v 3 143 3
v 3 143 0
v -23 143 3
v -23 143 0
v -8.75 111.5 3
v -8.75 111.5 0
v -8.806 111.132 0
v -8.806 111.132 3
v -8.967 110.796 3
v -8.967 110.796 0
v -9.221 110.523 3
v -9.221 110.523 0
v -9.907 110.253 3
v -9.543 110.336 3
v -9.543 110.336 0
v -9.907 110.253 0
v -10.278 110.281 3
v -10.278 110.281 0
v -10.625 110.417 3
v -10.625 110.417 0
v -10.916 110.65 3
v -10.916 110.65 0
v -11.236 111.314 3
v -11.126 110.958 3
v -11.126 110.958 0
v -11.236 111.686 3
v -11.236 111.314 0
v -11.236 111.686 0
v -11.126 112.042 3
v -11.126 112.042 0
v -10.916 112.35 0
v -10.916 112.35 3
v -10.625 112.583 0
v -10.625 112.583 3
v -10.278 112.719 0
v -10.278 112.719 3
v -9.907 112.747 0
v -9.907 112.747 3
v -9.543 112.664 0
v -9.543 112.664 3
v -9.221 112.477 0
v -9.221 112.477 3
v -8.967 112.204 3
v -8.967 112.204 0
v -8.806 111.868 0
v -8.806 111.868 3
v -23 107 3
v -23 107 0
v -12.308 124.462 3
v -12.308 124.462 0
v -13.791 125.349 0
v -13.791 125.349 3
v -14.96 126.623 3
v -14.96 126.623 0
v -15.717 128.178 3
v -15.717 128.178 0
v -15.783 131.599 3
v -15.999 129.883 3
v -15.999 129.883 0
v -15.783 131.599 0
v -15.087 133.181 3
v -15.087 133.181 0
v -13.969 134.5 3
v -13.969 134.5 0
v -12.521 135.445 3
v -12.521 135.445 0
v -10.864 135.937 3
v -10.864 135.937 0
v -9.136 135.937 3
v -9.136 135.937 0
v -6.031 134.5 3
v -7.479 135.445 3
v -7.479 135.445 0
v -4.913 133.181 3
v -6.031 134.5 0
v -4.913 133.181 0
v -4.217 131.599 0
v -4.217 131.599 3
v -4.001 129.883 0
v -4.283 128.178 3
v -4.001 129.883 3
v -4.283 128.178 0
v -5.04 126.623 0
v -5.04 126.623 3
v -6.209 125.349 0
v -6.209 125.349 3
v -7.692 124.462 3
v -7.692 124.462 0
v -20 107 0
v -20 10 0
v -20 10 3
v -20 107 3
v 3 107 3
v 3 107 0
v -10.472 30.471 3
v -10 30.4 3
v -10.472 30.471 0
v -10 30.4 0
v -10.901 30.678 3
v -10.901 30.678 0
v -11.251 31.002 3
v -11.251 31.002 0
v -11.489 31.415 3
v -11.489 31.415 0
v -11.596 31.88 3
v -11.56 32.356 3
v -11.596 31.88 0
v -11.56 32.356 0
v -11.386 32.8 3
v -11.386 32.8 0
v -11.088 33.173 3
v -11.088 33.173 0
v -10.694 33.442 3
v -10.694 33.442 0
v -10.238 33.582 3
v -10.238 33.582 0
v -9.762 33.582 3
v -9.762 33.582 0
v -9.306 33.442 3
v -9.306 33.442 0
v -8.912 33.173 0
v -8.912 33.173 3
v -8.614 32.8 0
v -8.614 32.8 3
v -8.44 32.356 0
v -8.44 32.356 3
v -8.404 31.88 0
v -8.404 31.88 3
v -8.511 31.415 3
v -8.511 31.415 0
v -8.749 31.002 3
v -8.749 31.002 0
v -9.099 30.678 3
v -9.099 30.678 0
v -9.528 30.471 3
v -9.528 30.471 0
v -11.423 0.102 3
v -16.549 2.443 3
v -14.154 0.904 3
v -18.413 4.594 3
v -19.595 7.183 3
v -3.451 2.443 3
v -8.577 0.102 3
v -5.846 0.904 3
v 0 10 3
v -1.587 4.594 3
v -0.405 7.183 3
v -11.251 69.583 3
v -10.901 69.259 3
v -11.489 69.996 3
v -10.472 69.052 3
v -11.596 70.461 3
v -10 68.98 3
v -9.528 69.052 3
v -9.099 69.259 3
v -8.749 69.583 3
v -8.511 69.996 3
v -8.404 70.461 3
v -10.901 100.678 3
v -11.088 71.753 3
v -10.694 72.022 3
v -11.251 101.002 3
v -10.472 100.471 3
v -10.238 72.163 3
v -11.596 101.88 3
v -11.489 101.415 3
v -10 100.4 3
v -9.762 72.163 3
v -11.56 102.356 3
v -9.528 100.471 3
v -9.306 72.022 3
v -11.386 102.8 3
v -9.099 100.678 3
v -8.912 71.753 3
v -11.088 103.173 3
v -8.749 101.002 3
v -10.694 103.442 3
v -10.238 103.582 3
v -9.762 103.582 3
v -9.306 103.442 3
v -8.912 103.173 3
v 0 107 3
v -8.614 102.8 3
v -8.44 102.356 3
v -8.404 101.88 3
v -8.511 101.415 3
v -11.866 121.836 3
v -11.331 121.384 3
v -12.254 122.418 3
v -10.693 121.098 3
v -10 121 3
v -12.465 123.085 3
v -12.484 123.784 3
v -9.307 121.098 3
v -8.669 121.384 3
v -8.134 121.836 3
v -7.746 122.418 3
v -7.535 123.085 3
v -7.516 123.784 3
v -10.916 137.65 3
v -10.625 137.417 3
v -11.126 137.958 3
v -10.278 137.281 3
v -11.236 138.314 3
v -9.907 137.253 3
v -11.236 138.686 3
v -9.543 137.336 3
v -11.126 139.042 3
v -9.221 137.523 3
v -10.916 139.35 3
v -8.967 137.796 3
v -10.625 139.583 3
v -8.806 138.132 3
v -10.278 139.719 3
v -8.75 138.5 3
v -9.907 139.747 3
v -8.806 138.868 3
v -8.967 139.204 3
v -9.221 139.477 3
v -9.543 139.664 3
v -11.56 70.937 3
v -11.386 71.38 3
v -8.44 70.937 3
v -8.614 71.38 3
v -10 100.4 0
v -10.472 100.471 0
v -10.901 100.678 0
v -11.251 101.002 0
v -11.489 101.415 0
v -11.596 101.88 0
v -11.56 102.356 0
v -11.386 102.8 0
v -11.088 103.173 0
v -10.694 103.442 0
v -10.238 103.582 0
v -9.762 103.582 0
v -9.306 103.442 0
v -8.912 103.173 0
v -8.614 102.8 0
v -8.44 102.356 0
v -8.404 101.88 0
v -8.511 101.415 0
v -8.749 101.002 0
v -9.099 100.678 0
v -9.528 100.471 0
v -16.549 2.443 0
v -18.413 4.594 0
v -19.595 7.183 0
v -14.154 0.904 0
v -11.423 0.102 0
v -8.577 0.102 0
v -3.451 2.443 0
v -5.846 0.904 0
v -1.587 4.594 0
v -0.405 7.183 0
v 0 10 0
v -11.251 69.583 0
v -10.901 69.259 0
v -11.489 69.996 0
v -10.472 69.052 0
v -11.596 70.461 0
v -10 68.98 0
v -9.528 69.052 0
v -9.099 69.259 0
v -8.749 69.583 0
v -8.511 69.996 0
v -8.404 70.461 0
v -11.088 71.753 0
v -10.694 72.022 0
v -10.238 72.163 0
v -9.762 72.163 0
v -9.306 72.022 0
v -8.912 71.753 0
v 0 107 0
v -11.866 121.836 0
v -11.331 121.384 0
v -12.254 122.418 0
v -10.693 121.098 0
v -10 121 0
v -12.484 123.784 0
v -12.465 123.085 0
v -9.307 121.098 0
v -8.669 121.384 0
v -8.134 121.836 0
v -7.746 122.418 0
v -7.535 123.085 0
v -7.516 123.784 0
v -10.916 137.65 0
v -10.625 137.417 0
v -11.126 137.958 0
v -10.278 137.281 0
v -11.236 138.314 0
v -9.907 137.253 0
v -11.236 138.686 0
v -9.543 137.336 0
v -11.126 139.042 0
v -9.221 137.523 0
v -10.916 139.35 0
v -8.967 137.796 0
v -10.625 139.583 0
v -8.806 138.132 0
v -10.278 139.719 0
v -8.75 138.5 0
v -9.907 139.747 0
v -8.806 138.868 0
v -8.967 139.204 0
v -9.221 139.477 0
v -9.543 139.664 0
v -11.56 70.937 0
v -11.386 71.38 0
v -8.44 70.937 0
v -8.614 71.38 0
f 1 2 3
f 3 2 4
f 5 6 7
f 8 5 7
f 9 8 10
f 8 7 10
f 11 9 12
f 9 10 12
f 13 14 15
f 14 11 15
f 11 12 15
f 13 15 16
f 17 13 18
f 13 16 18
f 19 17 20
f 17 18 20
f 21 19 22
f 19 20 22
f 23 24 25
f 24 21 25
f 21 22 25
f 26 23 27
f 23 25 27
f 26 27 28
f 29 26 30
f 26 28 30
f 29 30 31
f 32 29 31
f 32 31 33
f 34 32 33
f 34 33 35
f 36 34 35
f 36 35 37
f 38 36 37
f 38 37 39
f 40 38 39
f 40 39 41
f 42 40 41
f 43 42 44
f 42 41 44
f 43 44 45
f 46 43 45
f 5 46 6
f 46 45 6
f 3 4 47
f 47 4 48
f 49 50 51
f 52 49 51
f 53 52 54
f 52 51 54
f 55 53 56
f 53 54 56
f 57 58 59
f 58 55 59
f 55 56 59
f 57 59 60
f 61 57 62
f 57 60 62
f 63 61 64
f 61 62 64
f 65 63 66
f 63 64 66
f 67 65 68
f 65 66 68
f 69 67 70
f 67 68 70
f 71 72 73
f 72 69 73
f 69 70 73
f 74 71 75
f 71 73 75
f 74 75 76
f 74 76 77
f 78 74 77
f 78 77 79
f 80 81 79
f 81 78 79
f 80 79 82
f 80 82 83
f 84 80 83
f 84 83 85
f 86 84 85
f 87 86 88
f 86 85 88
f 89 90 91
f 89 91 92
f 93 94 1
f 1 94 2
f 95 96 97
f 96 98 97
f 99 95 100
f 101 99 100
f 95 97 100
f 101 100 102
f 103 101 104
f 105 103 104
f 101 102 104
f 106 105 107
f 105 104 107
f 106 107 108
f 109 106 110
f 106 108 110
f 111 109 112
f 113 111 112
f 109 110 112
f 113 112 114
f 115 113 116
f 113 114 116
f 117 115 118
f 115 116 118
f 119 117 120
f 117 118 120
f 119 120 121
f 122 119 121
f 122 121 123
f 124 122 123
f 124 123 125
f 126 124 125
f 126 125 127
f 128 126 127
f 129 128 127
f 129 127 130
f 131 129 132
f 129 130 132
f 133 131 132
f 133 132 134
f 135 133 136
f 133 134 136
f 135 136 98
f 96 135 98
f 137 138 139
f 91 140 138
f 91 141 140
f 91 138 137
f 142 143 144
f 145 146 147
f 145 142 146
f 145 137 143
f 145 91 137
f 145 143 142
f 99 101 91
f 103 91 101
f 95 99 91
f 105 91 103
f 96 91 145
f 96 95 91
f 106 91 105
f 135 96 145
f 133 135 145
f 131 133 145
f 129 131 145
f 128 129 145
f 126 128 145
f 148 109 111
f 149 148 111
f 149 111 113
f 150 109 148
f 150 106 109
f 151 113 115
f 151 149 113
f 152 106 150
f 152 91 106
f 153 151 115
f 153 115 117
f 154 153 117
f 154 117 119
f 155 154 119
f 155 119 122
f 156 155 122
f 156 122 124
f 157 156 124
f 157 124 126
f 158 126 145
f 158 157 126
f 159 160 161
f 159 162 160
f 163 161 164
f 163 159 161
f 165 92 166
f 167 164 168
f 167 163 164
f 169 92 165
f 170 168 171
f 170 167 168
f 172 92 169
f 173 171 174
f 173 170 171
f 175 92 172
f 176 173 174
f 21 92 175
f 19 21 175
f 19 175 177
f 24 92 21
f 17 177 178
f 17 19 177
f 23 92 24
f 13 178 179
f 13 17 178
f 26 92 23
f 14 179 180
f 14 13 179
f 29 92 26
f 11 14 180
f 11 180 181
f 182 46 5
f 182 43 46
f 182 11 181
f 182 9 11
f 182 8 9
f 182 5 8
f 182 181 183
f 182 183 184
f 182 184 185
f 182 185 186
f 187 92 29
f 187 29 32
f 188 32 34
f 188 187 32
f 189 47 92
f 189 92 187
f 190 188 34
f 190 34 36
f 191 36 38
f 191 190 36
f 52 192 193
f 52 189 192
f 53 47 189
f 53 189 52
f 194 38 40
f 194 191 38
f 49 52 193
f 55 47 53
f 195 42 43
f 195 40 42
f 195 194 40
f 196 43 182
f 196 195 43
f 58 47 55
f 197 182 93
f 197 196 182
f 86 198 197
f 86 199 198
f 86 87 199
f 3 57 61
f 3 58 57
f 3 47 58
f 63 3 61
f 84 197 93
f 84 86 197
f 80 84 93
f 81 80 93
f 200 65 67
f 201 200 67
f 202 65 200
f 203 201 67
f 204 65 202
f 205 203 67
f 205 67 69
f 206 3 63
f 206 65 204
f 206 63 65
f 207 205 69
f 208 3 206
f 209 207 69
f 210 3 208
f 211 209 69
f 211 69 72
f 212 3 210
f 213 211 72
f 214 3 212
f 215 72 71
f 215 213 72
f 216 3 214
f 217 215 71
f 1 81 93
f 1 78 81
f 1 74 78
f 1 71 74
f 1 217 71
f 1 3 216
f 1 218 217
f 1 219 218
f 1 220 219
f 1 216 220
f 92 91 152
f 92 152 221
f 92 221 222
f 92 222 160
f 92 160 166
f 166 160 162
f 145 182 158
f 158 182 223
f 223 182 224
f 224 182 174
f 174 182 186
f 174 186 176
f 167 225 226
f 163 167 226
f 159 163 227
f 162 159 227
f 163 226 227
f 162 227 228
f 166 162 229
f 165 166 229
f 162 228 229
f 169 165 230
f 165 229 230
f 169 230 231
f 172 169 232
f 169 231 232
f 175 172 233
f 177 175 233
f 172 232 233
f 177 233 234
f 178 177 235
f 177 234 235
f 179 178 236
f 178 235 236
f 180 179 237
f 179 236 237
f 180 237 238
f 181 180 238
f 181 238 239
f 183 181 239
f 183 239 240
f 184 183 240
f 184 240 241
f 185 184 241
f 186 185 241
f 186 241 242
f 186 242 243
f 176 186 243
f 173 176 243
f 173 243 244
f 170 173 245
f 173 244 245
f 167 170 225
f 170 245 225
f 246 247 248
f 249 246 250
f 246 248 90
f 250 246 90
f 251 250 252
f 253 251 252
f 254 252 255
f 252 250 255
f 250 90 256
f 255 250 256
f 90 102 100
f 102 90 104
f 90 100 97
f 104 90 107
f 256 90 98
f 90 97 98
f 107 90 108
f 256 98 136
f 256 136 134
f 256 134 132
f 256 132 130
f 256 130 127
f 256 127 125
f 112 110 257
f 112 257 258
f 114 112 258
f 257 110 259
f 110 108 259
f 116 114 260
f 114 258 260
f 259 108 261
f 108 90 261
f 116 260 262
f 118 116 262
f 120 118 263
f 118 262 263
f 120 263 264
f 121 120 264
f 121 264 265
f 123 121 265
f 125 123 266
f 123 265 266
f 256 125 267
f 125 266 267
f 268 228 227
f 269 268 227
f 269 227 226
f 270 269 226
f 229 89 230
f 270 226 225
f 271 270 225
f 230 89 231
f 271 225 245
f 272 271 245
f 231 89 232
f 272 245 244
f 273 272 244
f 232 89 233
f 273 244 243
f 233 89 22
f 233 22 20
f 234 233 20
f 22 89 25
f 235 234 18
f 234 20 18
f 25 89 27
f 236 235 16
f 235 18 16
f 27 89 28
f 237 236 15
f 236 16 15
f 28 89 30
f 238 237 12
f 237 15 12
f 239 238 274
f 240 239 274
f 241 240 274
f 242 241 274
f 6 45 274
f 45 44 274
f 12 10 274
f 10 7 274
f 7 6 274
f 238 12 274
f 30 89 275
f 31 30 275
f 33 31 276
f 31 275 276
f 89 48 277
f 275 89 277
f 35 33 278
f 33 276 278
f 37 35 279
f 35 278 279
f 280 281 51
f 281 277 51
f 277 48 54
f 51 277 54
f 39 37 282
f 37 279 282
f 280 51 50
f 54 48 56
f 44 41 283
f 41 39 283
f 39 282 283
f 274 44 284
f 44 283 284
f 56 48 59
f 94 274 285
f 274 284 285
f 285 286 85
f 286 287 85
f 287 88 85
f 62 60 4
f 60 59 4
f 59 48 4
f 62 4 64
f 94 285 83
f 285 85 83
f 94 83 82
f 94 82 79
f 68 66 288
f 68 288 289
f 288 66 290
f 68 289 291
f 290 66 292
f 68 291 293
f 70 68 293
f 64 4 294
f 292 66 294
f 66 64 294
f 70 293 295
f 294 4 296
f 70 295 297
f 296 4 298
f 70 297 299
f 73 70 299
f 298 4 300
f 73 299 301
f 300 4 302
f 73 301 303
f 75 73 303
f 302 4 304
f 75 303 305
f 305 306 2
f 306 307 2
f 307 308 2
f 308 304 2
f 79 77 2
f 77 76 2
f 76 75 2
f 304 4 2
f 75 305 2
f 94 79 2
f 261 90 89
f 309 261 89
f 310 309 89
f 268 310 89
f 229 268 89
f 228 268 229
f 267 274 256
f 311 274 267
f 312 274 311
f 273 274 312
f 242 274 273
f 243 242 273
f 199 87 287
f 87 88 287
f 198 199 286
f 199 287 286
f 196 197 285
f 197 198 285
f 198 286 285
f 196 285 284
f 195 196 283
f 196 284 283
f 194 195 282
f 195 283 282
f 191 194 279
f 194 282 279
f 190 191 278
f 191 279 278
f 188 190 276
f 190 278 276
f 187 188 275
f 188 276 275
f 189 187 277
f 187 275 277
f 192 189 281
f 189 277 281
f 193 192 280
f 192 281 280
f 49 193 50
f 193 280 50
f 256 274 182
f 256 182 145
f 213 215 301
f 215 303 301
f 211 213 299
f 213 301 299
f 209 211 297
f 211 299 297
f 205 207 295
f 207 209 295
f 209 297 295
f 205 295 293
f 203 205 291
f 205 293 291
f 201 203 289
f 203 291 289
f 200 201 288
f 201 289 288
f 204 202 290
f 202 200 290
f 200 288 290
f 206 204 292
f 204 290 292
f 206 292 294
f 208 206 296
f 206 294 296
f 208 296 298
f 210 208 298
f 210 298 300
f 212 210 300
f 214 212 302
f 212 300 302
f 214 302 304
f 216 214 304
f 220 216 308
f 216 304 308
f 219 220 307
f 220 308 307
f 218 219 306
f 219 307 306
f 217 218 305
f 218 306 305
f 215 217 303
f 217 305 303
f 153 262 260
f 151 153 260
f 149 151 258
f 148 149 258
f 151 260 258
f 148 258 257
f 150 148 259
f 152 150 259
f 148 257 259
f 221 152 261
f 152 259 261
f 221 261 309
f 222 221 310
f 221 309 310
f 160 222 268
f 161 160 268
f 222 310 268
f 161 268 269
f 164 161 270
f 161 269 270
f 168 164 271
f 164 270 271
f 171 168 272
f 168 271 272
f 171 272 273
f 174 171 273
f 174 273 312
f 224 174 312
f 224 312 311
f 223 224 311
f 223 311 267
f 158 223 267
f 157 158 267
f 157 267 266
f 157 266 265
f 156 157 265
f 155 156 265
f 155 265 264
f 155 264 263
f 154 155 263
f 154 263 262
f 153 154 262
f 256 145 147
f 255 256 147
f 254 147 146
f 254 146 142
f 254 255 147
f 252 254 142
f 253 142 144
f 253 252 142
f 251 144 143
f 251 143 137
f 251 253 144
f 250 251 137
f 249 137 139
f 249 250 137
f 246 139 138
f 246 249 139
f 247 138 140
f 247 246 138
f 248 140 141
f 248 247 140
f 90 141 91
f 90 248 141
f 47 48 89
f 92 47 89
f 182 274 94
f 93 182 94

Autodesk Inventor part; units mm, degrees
ref_plane "YZ Plane" through (0, 0, 0) normal (1, 0, 0) x (0, 1, 0)
ref_plane "XZ Plane" through (0, 0, 0) normal (0, 1, 0) x (-1, 0, 0)
ref_plane "XY Plane" through (0, 0, 0) normal (0, 0, 1) x (1, 0, 0)
sketch "Szkic1" plane through (0, 0, 0) normal (0, 0, 1) x (1, 0, 0)
  line L0 (-10, 0) -> (-10, 0)
  line L1 (-20, 10) -> (-20, 107)
  line L2 (0, 107) -> (0, 10)
  arc A0 (-20, 10) -> (-10, 0) centre (-10, 10) ccw
  arc A1 (-10, 0) -> (0, 10) centre (-10, 10) ccw
  line L3 (-23, 143) -> (-23, 107)
  line L4 (3, 107) -> (3, 143)
  line L5 (3, 143) -> (-23, 143)
  line L6 (-23, 143) -> (3, 107) construction
  line L7 (-23, 107) -> (3, 143) construction
  line L8 (-23, 107) -> (-20, 107)
  line L9 (0, 107) -> (3, 107)
  arc A2 (-7.6923, 124.4615) -> (-12.3077, 124.4615) centre (-10, 130) ccw
  arc A3 (-12.3077, 124.4615) -> (-7.6923, 124.4615) centre (-10, 123.5) ccw
  circle A4 centre (-10, 111.5) radius 1.25
  circle A5 centre (-10, 138.5) radius 1.25
  point P0 (0, 0)
  point P1 (-10, 125)
  dimension "d2" = 10
  dimension "d3" = 26
  dimension "d4" = 36
  dimension "d5" = 20
  dimension "d10" = 3
  dimension "d13" = 5
  dimension "d19" = 2.5
  dimension "d20" = 2.5
  dimension "d22" = 6
  dimension "d23" = 13
  dimension "d24" = 13
  dimension "d25" = 6.5
  dimension "d26" = 13
  dimension "d27" = 4.5
  dimension "d28" = 31.5
  dimension "d29" = 13
  dimension "d30" = 120
  dimension "d31" = 36
extrude "Wyciągnięcie proste1" add sketch "Szkic1" along normal blind 3
sketch "Szkic2" plane through (0, 0, 3) normal (0, 0, 1) x (1, 0, 0)
  point P0 (0, 0)
  point P1 (-10, 32)
  point P2 (-10, 70.5805)
  dimension "d49" = 32
hole "Otwór1" at (-10, 32, 3) at (-10, 70.5805, 3) direction (0, 0, -1) diameter 3.2 end through all
sketch "Szkic3" plane through (0, 0, 3) normal (0, 0, 1) x (1, 0, 0)
  arc A0 (-20, 10) -> (0, 10) centre (-10, 10) ccw projected
  point P0 (0, 0)
  point P1 (-10, 102)
  dimension "d41" = 92
hole "Otwór2" at (-10, 102, 3) direction (0, 0, -1) diameter 3.2 end through all
sketch "Szkic4" plane through (0, 0, 3) normal (0, 0, 1) x (1, 0, 0)
  arc A0 (-20, 10) -> (0, 10) centre (-10, 10) ccw projected
  point P0 (0, 0)
properties material "Drewno (wiśnia)"
